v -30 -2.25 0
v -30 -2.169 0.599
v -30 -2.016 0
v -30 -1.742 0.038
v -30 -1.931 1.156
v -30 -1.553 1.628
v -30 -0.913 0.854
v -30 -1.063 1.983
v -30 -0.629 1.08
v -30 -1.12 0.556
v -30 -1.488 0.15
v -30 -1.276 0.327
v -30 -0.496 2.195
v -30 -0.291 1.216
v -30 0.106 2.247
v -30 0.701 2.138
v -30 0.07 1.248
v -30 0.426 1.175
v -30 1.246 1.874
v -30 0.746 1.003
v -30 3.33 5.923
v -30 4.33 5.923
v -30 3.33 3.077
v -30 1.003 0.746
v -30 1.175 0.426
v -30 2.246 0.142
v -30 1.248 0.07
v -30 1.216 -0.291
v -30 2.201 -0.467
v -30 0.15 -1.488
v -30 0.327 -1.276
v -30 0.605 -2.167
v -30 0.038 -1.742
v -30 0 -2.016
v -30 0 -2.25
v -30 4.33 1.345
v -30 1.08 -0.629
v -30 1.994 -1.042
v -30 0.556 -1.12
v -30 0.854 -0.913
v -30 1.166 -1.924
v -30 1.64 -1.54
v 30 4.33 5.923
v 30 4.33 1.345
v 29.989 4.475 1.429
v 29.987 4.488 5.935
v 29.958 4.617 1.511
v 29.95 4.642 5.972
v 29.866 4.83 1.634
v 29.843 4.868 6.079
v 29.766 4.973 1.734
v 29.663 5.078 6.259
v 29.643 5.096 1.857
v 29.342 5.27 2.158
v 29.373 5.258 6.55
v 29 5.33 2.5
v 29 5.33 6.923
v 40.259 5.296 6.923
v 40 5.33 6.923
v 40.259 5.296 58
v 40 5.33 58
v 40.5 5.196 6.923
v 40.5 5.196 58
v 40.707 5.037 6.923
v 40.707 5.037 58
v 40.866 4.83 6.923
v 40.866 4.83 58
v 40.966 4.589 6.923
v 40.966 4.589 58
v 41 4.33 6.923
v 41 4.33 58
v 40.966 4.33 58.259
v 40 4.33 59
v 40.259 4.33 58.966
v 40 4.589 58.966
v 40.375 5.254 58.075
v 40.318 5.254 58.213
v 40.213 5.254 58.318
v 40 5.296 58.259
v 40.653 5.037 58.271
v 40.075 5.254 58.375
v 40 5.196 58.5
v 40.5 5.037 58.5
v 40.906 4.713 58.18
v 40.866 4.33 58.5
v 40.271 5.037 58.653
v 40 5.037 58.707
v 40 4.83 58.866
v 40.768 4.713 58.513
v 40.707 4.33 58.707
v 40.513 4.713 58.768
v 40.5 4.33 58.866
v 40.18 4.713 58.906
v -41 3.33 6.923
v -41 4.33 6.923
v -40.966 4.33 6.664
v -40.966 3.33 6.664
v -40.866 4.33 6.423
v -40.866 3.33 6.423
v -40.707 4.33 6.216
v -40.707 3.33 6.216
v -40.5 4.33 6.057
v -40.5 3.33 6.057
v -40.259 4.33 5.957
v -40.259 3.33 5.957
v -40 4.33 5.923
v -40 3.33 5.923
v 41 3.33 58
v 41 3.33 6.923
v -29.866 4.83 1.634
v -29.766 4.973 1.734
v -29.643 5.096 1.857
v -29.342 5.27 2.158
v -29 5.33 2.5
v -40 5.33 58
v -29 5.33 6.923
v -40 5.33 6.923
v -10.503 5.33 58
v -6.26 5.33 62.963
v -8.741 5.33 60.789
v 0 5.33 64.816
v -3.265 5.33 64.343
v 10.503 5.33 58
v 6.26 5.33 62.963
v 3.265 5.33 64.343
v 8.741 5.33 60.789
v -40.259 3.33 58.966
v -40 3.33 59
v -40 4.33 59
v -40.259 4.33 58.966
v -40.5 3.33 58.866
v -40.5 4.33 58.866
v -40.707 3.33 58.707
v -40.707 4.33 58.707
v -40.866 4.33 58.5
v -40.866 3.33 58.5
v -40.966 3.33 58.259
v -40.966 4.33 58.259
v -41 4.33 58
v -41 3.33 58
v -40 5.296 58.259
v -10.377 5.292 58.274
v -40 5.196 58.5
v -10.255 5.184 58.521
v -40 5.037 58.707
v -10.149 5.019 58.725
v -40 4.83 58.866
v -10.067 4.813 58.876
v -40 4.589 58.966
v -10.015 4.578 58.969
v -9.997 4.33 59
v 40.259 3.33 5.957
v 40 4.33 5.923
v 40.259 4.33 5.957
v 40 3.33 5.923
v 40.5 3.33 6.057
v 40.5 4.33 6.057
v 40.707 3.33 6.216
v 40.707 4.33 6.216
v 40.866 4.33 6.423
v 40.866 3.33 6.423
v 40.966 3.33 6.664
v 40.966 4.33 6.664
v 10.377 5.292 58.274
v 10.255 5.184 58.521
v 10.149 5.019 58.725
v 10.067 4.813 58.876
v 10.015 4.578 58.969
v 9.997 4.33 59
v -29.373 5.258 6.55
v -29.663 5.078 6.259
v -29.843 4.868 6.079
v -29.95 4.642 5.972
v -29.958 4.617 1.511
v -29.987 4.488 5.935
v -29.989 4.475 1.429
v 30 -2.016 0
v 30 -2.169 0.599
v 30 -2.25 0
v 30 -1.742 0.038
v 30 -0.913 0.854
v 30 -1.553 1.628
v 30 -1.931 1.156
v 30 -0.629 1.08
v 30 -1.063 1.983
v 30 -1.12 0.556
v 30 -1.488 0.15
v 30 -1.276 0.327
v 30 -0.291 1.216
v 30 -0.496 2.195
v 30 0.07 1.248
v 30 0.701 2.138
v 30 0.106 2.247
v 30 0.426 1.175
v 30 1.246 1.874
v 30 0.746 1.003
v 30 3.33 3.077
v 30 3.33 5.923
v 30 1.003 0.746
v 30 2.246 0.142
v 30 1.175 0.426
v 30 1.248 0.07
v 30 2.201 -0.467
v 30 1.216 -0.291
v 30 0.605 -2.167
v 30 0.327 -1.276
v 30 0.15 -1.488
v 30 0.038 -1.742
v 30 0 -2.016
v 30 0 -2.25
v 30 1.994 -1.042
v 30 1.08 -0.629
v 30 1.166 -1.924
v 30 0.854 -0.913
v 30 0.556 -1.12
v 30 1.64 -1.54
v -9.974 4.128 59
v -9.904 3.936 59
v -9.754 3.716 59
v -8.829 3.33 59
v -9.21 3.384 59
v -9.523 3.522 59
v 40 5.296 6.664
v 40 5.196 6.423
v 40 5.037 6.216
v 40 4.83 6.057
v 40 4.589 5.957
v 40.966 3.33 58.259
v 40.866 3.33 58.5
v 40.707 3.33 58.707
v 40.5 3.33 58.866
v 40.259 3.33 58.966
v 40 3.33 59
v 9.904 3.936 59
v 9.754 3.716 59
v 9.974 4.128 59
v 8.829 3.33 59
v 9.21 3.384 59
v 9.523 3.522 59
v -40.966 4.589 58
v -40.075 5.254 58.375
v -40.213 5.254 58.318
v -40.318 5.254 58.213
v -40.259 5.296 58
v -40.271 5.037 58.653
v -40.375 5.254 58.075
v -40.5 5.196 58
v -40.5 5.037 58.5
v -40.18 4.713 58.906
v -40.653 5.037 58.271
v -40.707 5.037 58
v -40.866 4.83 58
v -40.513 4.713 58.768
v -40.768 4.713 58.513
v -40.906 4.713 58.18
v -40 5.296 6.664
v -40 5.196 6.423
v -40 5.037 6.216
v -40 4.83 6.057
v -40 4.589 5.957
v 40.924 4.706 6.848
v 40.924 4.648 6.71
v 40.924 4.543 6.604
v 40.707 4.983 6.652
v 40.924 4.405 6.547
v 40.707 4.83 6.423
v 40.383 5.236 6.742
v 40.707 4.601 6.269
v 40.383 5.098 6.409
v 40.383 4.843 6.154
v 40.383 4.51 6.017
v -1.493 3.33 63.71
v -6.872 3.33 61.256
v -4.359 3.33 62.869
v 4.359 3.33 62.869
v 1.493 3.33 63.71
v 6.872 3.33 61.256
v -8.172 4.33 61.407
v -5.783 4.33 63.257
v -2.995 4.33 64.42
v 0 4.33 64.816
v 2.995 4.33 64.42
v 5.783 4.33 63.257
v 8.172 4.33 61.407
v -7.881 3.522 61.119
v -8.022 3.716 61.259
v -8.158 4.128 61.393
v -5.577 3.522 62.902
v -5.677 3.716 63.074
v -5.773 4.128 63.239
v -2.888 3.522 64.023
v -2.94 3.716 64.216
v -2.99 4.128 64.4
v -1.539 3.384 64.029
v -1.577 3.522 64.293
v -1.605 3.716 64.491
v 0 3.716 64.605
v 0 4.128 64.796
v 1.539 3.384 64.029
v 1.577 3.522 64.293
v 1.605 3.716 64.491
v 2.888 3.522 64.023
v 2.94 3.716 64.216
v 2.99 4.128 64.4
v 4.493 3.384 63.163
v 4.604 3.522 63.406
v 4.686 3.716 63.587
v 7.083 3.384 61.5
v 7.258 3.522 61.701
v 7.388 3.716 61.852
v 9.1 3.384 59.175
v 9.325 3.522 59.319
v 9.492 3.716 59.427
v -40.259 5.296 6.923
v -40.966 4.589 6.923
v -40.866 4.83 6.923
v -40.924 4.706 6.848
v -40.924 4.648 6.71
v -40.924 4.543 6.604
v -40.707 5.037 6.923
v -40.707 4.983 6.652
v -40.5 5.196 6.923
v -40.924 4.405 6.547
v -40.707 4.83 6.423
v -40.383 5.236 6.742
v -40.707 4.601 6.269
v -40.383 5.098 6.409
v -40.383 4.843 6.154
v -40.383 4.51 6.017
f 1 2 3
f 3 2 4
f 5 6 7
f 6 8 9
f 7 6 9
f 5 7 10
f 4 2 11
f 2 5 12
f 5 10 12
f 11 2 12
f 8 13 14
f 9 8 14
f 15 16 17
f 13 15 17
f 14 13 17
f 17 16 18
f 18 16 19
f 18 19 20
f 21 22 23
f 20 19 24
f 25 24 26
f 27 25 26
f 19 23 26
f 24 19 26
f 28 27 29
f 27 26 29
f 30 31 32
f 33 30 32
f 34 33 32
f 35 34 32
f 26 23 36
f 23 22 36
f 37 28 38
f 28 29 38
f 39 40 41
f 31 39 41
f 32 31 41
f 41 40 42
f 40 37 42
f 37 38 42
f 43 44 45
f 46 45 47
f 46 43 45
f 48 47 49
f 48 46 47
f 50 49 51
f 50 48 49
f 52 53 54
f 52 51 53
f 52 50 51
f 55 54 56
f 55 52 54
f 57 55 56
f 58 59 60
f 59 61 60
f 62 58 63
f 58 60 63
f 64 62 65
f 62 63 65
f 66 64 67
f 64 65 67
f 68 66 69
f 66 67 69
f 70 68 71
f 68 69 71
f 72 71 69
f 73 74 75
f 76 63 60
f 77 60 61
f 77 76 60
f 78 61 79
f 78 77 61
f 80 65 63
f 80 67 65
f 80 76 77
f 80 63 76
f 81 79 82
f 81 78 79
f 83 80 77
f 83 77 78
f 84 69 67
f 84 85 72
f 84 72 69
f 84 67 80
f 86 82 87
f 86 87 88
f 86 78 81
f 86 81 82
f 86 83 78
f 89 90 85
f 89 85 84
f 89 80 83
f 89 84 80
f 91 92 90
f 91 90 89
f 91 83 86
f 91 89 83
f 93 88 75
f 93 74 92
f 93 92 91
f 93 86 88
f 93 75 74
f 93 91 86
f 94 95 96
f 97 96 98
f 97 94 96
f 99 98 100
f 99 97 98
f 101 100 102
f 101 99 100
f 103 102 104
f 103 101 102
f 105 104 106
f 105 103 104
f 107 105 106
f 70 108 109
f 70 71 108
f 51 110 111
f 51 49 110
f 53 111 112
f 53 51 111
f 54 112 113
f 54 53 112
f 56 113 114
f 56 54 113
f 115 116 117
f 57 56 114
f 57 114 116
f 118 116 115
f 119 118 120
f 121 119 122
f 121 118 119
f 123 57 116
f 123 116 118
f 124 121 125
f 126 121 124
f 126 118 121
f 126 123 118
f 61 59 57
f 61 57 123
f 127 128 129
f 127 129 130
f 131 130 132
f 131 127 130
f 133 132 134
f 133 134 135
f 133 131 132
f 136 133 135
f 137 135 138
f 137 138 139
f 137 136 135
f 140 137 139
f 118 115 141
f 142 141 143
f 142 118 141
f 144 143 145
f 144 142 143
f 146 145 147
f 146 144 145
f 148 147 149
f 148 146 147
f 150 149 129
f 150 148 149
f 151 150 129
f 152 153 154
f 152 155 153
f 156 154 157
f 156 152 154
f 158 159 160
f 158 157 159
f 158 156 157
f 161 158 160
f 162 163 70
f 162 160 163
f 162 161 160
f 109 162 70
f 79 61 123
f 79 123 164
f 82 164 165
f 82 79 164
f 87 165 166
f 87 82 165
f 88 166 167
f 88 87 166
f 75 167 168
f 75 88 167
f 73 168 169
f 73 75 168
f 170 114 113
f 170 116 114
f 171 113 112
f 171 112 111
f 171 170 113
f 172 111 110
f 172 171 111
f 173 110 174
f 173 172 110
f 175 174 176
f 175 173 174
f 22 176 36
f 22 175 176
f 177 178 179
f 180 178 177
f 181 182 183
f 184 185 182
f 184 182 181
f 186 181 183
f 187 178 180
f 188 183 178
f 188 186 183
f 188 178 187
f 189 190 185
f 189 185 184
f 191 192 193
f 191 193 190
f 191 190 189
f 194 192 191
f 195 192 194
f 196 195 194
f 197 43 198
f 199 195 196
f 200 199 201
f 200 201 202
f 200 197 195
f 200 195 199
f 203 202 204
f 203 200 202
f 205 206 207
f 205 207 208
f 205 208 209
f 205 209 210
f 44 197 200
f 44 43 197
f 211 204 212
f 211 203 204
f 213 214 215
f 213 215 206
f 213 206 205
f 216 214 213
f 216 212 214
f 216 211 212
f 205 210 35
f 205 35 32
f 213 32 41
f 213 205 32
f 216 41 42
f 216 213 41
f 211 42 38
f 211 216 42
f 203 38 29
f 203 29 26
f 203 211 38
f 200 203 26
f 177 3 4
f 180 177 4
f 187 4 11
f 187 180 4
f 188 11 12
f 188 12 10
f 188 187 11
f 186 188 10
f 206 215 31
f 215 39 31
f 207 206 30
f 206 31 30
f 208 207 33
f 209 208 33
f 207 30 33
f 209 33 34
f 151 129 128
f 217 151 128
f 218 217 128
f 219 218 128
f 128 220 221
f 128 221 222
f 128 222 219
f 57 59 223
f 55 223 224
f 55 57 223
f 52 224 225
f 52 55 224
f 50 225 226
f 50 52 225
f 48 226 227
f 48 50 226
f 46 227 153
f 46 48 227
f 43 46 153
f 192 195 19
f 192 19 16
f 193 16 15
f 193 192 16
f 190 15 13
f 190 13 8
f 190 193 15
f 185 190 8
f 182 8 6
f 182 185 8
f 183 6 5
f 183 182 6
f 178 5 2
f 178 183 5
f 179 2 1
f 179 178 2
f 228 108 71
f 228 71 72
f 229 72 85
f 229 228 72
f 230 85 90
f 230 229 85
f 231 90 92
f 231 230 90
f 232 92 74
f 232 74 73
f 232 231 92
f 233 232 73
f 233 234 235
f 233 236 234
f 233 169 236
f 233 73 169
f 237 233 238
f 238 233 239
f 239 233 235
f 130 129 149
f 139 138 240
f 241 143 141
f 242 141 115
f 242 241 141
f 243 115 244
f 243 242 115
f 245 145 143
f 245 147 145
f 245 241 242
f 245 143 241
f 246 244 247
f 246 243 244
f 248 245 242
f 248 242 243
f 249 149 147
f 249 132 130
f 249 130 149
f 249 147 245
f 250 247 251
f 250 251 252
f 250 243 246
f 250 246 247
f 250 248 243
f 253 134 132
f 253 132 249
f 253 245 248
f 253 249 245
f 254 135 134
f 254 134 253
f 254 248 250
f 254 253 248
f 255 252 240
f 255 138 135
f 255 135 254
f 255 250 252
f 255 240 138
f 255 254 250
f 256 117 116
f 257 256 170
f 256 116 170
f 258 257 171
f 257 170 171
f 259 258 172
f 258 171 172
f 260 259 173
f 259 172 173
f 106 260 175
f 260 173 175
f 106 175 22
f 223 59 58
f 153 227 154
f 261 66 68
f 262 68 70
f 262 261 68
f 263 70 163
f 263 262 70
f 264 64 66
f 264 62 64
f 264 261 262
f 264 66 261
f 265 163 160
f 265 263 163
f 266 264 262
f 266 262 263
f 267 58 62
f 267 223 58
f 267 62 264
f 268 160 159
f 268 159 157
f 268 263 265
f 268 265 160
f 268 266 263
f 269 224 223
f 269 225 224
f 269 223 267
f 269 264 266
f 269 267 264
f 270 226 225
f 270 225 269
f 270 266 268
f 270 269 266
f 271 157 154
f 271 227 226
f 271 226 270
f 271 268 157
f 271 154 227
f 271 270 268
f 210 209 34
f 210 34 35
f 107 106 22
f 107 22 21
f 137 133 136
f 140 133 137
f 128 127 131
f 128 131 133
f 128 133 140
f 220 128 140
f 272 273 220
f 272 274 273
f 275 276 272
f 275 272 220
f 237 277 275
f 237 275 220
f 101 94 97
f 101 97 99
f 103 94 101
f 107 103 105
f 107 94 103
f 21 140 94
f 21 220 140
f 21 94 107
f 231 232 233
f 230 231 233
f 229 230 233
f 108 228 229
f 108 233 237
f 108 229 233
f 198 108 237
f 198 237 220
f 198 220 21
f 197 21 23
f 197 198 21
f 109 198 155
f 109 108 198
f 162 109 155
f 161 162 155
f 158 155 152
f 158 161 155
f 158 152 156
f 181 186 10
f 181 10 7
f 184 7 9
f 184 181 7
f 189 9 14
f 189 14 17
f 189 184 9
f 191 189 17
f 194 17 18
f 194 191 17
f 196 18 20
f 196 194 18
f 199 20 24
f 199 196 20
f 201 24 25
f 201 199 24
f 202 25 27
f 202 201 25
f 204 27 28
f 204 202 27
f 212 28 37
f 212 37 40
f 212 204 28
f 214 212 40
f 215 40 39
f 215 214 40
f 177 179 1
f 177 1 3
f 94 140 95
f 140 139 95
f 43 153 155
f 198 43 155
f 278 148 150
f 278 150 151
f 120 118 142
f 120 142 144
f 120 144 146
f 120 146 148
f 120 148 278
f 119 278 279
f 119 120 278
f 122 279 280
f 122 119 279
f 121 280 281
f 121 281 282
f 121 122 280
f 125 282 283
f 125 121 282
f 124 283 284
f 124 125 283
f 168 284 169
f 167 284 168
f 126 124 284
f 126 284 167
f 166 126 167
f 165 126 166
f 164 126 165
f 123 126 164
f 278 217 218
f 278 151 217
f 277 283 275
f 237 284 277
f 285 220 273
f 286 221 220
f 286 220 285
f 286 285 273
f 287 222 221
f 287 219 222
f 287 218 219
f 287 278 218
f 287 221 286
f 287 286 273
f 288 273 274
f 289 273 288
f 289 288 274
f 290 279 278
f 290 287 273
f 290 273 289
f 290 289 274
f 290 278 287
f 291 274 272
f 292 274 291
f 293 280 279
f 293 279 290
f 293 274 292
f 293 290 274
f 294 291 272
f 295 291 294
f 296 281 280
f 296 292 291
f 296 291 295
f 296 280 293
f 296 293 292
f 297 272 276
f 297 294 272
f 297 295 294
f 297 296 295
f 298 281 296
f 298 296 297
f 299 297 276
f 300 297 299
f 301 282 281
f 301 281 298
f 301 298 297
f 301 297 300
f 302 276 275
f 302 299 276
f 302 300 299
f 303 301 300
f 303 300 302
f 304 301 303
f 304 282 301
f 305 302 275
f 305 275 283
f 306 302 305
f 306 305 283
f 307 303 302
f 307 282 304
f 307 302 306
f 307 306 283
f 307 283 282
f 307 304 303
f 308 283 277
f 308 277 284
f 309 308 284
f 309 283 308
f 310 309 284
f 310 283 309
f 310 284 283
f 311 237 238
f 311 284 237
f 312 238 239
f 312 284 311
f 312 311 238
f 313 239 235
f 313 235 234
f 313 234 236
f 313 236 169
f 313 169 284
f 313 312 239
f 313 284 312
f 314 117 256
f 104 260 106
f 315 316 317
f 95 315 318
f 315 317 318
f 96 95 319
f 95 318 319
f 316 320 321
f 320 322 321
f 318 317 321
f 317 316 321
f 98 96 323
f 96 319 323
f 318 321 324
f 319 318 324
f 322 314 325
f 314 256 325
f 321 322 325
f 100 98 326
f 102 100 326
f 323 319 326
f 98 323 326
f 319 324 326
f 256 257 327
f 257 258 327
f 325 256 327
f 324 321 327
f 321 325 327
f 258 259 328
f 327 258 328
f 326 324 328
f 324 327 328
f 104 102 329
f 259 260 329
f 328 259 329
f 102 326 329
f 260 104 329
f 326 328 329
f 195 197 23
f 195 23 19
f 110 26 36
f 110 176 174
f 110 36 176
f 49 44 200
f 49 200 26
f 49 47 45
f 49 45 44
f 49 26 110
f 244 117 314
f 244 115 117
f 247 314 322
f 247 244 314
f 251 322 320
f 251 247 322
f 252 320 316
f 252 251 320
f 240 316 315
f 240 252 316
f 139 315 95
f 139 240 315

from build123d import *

# Parameters (mm, degrees)
BOSS_EXTRUDE1_DEPTH = 41
CUT_EXTRUDE1_DEPTH  = 11
BOSS_EXTRUDE4_DEPTH = 2
FILLET1_R           = 1


with BuildPart() as part:
    # Sketch2 → Boss-Extrude1 (new, symmetric)
    with BuildSketch(Plane(origin=(0, 0, 0), x_dir=(0, 0, -1), z_dir=(1, 0, 0))):
        with BuildLine():
            Line((-0.141756815, 2.245530005), (-1.922649731, 5.330127019))
            Line((-1.922649731, 5.330127019), (-59, 5.330127019))
            Line((-59, 5.330127019), (-59, 3.330127019))
            Line((-59, 3.330127019), (-3.077350269, 3.330127019))
            Line((-3.077350269, 3.330127019), (-1.873807622, 1.245530005))
            ThreePointArc((-1.873807622, 1.245530005), (-1.983045954, -1.063028101), (0, -2.25))
            Line((0, -2.25), (0, -1.25))
            ThreePointArc((0, -1.25), (-0.883883476, 0.883883476), (1.25, 0))
            Line((1.25, 0), (2.25, 0))
            ThreePointArc((2.25, 0), (1.540056357, 1.640343384), (-0.141756815, 2.245530005))
        make_face()
    extrude(amount=BOSS_EXTRUDE1_DEPTH, both=True)

    # Sketch4 → Cut-Extrude1 (cut)
    with BuildSketch(Plane(origin=(41, 0, 0), x_dir=(0, 0, -1), z_dir=(1, 0, 0))):
        with BuildLine():
            Line((-3.077350269, 3.330127019), (-1.873807622, 1.245530005))
            ThreePointArc((-1.873807622, 1.245530005), (-1.983045954, -1.063028101), (0, -2.25))
            Line((0, -2.25), (0, -1.25))
            ThreePointArc((0, -1.25), (-0.883883476, 0.883883476), (1.25, 0))
            Line((1.25, 0), (2.25, 0))
            ThreePointArc((2.25, 0), (1.540056357, 1.640343384), (-0.141756815, 2.245530005))
            Line((-0.141756815, 2.245530005), (-1.922649731, 5.330127019))
            Line((-1.922649731, 5.330127019), (-5.922649731, 5.330127019))
            Line((-5.922649731, 5.330127019), (-5.922649731, 3.330127019))
            Line((-5.922649731, 3.330127019), (-3.077350269, 3.330127019))
        make_face()
    cut_extrude1 = extrude(amount=-CUT_EXTRUDE1_DEPTH, mode=Mode.SUBTRACT)

    # Mirror1: Cut-Extrude1 across plane
    add(cut_extrude1.mirror(Plane(origin=(0, 0, 0), x_dir=(0, 0, 1), z_dir=(1, 0, 0))), mode=Mode.SUBTRACT)

    # Sketch8 → Boss-Extrude4 (add)
    with BuildSketch(Plane(origin=(0, 5.330127019, 0), x_dir=(1, 0, 0), z_dir=(0, 1, 0))):
        with BuildLine():
            Line((0, -59), (-9.997341071, -59))
            ThreePointArc((-9.997341071, -59), (0, -64.816412092), (9.997341071, -59))
            Line((9.997341071, -59), (0, -59))
        make_face()
    extrude(amount=-BOSS_EXTRUDE4_DEPTH)

    # Fillet1
    fillet1_edges = [part.edges().sort_by_distance(p)[0] for p in [
        (-35.5, 5.330127019, 5.922649731),
        (35.5, 5.330127019, 5.922649731),
        (-41, 4.330127019, 59),
        (41, 4.330127019, 59),
        (41, 5.330127019, 32.461324865),
        (-25.498670535, 5.330127019, 59),
        (25.498670535, 5.330127019, 59),
        (-41, 5.330127019, 32.461324865),
        (41, 4.330127019, 5.922649731),
        (-41, 4.330127019, 5.922649731),
        (30, 5.330127019, 3.922649731),
        (-30, 5.330127019, 3.922649731),
        (0, 5.330127019, 1.922649731),
        (0, 3.330127019, 64.816412092),
        (0, -1.25, 0),
        (0, 0, -1.25),
    ]]
    fillet(fillet1_edges, radius=FILLET1_R - 0.0001)  # a hair under: the kernel refuses the full size


solid = part.part
